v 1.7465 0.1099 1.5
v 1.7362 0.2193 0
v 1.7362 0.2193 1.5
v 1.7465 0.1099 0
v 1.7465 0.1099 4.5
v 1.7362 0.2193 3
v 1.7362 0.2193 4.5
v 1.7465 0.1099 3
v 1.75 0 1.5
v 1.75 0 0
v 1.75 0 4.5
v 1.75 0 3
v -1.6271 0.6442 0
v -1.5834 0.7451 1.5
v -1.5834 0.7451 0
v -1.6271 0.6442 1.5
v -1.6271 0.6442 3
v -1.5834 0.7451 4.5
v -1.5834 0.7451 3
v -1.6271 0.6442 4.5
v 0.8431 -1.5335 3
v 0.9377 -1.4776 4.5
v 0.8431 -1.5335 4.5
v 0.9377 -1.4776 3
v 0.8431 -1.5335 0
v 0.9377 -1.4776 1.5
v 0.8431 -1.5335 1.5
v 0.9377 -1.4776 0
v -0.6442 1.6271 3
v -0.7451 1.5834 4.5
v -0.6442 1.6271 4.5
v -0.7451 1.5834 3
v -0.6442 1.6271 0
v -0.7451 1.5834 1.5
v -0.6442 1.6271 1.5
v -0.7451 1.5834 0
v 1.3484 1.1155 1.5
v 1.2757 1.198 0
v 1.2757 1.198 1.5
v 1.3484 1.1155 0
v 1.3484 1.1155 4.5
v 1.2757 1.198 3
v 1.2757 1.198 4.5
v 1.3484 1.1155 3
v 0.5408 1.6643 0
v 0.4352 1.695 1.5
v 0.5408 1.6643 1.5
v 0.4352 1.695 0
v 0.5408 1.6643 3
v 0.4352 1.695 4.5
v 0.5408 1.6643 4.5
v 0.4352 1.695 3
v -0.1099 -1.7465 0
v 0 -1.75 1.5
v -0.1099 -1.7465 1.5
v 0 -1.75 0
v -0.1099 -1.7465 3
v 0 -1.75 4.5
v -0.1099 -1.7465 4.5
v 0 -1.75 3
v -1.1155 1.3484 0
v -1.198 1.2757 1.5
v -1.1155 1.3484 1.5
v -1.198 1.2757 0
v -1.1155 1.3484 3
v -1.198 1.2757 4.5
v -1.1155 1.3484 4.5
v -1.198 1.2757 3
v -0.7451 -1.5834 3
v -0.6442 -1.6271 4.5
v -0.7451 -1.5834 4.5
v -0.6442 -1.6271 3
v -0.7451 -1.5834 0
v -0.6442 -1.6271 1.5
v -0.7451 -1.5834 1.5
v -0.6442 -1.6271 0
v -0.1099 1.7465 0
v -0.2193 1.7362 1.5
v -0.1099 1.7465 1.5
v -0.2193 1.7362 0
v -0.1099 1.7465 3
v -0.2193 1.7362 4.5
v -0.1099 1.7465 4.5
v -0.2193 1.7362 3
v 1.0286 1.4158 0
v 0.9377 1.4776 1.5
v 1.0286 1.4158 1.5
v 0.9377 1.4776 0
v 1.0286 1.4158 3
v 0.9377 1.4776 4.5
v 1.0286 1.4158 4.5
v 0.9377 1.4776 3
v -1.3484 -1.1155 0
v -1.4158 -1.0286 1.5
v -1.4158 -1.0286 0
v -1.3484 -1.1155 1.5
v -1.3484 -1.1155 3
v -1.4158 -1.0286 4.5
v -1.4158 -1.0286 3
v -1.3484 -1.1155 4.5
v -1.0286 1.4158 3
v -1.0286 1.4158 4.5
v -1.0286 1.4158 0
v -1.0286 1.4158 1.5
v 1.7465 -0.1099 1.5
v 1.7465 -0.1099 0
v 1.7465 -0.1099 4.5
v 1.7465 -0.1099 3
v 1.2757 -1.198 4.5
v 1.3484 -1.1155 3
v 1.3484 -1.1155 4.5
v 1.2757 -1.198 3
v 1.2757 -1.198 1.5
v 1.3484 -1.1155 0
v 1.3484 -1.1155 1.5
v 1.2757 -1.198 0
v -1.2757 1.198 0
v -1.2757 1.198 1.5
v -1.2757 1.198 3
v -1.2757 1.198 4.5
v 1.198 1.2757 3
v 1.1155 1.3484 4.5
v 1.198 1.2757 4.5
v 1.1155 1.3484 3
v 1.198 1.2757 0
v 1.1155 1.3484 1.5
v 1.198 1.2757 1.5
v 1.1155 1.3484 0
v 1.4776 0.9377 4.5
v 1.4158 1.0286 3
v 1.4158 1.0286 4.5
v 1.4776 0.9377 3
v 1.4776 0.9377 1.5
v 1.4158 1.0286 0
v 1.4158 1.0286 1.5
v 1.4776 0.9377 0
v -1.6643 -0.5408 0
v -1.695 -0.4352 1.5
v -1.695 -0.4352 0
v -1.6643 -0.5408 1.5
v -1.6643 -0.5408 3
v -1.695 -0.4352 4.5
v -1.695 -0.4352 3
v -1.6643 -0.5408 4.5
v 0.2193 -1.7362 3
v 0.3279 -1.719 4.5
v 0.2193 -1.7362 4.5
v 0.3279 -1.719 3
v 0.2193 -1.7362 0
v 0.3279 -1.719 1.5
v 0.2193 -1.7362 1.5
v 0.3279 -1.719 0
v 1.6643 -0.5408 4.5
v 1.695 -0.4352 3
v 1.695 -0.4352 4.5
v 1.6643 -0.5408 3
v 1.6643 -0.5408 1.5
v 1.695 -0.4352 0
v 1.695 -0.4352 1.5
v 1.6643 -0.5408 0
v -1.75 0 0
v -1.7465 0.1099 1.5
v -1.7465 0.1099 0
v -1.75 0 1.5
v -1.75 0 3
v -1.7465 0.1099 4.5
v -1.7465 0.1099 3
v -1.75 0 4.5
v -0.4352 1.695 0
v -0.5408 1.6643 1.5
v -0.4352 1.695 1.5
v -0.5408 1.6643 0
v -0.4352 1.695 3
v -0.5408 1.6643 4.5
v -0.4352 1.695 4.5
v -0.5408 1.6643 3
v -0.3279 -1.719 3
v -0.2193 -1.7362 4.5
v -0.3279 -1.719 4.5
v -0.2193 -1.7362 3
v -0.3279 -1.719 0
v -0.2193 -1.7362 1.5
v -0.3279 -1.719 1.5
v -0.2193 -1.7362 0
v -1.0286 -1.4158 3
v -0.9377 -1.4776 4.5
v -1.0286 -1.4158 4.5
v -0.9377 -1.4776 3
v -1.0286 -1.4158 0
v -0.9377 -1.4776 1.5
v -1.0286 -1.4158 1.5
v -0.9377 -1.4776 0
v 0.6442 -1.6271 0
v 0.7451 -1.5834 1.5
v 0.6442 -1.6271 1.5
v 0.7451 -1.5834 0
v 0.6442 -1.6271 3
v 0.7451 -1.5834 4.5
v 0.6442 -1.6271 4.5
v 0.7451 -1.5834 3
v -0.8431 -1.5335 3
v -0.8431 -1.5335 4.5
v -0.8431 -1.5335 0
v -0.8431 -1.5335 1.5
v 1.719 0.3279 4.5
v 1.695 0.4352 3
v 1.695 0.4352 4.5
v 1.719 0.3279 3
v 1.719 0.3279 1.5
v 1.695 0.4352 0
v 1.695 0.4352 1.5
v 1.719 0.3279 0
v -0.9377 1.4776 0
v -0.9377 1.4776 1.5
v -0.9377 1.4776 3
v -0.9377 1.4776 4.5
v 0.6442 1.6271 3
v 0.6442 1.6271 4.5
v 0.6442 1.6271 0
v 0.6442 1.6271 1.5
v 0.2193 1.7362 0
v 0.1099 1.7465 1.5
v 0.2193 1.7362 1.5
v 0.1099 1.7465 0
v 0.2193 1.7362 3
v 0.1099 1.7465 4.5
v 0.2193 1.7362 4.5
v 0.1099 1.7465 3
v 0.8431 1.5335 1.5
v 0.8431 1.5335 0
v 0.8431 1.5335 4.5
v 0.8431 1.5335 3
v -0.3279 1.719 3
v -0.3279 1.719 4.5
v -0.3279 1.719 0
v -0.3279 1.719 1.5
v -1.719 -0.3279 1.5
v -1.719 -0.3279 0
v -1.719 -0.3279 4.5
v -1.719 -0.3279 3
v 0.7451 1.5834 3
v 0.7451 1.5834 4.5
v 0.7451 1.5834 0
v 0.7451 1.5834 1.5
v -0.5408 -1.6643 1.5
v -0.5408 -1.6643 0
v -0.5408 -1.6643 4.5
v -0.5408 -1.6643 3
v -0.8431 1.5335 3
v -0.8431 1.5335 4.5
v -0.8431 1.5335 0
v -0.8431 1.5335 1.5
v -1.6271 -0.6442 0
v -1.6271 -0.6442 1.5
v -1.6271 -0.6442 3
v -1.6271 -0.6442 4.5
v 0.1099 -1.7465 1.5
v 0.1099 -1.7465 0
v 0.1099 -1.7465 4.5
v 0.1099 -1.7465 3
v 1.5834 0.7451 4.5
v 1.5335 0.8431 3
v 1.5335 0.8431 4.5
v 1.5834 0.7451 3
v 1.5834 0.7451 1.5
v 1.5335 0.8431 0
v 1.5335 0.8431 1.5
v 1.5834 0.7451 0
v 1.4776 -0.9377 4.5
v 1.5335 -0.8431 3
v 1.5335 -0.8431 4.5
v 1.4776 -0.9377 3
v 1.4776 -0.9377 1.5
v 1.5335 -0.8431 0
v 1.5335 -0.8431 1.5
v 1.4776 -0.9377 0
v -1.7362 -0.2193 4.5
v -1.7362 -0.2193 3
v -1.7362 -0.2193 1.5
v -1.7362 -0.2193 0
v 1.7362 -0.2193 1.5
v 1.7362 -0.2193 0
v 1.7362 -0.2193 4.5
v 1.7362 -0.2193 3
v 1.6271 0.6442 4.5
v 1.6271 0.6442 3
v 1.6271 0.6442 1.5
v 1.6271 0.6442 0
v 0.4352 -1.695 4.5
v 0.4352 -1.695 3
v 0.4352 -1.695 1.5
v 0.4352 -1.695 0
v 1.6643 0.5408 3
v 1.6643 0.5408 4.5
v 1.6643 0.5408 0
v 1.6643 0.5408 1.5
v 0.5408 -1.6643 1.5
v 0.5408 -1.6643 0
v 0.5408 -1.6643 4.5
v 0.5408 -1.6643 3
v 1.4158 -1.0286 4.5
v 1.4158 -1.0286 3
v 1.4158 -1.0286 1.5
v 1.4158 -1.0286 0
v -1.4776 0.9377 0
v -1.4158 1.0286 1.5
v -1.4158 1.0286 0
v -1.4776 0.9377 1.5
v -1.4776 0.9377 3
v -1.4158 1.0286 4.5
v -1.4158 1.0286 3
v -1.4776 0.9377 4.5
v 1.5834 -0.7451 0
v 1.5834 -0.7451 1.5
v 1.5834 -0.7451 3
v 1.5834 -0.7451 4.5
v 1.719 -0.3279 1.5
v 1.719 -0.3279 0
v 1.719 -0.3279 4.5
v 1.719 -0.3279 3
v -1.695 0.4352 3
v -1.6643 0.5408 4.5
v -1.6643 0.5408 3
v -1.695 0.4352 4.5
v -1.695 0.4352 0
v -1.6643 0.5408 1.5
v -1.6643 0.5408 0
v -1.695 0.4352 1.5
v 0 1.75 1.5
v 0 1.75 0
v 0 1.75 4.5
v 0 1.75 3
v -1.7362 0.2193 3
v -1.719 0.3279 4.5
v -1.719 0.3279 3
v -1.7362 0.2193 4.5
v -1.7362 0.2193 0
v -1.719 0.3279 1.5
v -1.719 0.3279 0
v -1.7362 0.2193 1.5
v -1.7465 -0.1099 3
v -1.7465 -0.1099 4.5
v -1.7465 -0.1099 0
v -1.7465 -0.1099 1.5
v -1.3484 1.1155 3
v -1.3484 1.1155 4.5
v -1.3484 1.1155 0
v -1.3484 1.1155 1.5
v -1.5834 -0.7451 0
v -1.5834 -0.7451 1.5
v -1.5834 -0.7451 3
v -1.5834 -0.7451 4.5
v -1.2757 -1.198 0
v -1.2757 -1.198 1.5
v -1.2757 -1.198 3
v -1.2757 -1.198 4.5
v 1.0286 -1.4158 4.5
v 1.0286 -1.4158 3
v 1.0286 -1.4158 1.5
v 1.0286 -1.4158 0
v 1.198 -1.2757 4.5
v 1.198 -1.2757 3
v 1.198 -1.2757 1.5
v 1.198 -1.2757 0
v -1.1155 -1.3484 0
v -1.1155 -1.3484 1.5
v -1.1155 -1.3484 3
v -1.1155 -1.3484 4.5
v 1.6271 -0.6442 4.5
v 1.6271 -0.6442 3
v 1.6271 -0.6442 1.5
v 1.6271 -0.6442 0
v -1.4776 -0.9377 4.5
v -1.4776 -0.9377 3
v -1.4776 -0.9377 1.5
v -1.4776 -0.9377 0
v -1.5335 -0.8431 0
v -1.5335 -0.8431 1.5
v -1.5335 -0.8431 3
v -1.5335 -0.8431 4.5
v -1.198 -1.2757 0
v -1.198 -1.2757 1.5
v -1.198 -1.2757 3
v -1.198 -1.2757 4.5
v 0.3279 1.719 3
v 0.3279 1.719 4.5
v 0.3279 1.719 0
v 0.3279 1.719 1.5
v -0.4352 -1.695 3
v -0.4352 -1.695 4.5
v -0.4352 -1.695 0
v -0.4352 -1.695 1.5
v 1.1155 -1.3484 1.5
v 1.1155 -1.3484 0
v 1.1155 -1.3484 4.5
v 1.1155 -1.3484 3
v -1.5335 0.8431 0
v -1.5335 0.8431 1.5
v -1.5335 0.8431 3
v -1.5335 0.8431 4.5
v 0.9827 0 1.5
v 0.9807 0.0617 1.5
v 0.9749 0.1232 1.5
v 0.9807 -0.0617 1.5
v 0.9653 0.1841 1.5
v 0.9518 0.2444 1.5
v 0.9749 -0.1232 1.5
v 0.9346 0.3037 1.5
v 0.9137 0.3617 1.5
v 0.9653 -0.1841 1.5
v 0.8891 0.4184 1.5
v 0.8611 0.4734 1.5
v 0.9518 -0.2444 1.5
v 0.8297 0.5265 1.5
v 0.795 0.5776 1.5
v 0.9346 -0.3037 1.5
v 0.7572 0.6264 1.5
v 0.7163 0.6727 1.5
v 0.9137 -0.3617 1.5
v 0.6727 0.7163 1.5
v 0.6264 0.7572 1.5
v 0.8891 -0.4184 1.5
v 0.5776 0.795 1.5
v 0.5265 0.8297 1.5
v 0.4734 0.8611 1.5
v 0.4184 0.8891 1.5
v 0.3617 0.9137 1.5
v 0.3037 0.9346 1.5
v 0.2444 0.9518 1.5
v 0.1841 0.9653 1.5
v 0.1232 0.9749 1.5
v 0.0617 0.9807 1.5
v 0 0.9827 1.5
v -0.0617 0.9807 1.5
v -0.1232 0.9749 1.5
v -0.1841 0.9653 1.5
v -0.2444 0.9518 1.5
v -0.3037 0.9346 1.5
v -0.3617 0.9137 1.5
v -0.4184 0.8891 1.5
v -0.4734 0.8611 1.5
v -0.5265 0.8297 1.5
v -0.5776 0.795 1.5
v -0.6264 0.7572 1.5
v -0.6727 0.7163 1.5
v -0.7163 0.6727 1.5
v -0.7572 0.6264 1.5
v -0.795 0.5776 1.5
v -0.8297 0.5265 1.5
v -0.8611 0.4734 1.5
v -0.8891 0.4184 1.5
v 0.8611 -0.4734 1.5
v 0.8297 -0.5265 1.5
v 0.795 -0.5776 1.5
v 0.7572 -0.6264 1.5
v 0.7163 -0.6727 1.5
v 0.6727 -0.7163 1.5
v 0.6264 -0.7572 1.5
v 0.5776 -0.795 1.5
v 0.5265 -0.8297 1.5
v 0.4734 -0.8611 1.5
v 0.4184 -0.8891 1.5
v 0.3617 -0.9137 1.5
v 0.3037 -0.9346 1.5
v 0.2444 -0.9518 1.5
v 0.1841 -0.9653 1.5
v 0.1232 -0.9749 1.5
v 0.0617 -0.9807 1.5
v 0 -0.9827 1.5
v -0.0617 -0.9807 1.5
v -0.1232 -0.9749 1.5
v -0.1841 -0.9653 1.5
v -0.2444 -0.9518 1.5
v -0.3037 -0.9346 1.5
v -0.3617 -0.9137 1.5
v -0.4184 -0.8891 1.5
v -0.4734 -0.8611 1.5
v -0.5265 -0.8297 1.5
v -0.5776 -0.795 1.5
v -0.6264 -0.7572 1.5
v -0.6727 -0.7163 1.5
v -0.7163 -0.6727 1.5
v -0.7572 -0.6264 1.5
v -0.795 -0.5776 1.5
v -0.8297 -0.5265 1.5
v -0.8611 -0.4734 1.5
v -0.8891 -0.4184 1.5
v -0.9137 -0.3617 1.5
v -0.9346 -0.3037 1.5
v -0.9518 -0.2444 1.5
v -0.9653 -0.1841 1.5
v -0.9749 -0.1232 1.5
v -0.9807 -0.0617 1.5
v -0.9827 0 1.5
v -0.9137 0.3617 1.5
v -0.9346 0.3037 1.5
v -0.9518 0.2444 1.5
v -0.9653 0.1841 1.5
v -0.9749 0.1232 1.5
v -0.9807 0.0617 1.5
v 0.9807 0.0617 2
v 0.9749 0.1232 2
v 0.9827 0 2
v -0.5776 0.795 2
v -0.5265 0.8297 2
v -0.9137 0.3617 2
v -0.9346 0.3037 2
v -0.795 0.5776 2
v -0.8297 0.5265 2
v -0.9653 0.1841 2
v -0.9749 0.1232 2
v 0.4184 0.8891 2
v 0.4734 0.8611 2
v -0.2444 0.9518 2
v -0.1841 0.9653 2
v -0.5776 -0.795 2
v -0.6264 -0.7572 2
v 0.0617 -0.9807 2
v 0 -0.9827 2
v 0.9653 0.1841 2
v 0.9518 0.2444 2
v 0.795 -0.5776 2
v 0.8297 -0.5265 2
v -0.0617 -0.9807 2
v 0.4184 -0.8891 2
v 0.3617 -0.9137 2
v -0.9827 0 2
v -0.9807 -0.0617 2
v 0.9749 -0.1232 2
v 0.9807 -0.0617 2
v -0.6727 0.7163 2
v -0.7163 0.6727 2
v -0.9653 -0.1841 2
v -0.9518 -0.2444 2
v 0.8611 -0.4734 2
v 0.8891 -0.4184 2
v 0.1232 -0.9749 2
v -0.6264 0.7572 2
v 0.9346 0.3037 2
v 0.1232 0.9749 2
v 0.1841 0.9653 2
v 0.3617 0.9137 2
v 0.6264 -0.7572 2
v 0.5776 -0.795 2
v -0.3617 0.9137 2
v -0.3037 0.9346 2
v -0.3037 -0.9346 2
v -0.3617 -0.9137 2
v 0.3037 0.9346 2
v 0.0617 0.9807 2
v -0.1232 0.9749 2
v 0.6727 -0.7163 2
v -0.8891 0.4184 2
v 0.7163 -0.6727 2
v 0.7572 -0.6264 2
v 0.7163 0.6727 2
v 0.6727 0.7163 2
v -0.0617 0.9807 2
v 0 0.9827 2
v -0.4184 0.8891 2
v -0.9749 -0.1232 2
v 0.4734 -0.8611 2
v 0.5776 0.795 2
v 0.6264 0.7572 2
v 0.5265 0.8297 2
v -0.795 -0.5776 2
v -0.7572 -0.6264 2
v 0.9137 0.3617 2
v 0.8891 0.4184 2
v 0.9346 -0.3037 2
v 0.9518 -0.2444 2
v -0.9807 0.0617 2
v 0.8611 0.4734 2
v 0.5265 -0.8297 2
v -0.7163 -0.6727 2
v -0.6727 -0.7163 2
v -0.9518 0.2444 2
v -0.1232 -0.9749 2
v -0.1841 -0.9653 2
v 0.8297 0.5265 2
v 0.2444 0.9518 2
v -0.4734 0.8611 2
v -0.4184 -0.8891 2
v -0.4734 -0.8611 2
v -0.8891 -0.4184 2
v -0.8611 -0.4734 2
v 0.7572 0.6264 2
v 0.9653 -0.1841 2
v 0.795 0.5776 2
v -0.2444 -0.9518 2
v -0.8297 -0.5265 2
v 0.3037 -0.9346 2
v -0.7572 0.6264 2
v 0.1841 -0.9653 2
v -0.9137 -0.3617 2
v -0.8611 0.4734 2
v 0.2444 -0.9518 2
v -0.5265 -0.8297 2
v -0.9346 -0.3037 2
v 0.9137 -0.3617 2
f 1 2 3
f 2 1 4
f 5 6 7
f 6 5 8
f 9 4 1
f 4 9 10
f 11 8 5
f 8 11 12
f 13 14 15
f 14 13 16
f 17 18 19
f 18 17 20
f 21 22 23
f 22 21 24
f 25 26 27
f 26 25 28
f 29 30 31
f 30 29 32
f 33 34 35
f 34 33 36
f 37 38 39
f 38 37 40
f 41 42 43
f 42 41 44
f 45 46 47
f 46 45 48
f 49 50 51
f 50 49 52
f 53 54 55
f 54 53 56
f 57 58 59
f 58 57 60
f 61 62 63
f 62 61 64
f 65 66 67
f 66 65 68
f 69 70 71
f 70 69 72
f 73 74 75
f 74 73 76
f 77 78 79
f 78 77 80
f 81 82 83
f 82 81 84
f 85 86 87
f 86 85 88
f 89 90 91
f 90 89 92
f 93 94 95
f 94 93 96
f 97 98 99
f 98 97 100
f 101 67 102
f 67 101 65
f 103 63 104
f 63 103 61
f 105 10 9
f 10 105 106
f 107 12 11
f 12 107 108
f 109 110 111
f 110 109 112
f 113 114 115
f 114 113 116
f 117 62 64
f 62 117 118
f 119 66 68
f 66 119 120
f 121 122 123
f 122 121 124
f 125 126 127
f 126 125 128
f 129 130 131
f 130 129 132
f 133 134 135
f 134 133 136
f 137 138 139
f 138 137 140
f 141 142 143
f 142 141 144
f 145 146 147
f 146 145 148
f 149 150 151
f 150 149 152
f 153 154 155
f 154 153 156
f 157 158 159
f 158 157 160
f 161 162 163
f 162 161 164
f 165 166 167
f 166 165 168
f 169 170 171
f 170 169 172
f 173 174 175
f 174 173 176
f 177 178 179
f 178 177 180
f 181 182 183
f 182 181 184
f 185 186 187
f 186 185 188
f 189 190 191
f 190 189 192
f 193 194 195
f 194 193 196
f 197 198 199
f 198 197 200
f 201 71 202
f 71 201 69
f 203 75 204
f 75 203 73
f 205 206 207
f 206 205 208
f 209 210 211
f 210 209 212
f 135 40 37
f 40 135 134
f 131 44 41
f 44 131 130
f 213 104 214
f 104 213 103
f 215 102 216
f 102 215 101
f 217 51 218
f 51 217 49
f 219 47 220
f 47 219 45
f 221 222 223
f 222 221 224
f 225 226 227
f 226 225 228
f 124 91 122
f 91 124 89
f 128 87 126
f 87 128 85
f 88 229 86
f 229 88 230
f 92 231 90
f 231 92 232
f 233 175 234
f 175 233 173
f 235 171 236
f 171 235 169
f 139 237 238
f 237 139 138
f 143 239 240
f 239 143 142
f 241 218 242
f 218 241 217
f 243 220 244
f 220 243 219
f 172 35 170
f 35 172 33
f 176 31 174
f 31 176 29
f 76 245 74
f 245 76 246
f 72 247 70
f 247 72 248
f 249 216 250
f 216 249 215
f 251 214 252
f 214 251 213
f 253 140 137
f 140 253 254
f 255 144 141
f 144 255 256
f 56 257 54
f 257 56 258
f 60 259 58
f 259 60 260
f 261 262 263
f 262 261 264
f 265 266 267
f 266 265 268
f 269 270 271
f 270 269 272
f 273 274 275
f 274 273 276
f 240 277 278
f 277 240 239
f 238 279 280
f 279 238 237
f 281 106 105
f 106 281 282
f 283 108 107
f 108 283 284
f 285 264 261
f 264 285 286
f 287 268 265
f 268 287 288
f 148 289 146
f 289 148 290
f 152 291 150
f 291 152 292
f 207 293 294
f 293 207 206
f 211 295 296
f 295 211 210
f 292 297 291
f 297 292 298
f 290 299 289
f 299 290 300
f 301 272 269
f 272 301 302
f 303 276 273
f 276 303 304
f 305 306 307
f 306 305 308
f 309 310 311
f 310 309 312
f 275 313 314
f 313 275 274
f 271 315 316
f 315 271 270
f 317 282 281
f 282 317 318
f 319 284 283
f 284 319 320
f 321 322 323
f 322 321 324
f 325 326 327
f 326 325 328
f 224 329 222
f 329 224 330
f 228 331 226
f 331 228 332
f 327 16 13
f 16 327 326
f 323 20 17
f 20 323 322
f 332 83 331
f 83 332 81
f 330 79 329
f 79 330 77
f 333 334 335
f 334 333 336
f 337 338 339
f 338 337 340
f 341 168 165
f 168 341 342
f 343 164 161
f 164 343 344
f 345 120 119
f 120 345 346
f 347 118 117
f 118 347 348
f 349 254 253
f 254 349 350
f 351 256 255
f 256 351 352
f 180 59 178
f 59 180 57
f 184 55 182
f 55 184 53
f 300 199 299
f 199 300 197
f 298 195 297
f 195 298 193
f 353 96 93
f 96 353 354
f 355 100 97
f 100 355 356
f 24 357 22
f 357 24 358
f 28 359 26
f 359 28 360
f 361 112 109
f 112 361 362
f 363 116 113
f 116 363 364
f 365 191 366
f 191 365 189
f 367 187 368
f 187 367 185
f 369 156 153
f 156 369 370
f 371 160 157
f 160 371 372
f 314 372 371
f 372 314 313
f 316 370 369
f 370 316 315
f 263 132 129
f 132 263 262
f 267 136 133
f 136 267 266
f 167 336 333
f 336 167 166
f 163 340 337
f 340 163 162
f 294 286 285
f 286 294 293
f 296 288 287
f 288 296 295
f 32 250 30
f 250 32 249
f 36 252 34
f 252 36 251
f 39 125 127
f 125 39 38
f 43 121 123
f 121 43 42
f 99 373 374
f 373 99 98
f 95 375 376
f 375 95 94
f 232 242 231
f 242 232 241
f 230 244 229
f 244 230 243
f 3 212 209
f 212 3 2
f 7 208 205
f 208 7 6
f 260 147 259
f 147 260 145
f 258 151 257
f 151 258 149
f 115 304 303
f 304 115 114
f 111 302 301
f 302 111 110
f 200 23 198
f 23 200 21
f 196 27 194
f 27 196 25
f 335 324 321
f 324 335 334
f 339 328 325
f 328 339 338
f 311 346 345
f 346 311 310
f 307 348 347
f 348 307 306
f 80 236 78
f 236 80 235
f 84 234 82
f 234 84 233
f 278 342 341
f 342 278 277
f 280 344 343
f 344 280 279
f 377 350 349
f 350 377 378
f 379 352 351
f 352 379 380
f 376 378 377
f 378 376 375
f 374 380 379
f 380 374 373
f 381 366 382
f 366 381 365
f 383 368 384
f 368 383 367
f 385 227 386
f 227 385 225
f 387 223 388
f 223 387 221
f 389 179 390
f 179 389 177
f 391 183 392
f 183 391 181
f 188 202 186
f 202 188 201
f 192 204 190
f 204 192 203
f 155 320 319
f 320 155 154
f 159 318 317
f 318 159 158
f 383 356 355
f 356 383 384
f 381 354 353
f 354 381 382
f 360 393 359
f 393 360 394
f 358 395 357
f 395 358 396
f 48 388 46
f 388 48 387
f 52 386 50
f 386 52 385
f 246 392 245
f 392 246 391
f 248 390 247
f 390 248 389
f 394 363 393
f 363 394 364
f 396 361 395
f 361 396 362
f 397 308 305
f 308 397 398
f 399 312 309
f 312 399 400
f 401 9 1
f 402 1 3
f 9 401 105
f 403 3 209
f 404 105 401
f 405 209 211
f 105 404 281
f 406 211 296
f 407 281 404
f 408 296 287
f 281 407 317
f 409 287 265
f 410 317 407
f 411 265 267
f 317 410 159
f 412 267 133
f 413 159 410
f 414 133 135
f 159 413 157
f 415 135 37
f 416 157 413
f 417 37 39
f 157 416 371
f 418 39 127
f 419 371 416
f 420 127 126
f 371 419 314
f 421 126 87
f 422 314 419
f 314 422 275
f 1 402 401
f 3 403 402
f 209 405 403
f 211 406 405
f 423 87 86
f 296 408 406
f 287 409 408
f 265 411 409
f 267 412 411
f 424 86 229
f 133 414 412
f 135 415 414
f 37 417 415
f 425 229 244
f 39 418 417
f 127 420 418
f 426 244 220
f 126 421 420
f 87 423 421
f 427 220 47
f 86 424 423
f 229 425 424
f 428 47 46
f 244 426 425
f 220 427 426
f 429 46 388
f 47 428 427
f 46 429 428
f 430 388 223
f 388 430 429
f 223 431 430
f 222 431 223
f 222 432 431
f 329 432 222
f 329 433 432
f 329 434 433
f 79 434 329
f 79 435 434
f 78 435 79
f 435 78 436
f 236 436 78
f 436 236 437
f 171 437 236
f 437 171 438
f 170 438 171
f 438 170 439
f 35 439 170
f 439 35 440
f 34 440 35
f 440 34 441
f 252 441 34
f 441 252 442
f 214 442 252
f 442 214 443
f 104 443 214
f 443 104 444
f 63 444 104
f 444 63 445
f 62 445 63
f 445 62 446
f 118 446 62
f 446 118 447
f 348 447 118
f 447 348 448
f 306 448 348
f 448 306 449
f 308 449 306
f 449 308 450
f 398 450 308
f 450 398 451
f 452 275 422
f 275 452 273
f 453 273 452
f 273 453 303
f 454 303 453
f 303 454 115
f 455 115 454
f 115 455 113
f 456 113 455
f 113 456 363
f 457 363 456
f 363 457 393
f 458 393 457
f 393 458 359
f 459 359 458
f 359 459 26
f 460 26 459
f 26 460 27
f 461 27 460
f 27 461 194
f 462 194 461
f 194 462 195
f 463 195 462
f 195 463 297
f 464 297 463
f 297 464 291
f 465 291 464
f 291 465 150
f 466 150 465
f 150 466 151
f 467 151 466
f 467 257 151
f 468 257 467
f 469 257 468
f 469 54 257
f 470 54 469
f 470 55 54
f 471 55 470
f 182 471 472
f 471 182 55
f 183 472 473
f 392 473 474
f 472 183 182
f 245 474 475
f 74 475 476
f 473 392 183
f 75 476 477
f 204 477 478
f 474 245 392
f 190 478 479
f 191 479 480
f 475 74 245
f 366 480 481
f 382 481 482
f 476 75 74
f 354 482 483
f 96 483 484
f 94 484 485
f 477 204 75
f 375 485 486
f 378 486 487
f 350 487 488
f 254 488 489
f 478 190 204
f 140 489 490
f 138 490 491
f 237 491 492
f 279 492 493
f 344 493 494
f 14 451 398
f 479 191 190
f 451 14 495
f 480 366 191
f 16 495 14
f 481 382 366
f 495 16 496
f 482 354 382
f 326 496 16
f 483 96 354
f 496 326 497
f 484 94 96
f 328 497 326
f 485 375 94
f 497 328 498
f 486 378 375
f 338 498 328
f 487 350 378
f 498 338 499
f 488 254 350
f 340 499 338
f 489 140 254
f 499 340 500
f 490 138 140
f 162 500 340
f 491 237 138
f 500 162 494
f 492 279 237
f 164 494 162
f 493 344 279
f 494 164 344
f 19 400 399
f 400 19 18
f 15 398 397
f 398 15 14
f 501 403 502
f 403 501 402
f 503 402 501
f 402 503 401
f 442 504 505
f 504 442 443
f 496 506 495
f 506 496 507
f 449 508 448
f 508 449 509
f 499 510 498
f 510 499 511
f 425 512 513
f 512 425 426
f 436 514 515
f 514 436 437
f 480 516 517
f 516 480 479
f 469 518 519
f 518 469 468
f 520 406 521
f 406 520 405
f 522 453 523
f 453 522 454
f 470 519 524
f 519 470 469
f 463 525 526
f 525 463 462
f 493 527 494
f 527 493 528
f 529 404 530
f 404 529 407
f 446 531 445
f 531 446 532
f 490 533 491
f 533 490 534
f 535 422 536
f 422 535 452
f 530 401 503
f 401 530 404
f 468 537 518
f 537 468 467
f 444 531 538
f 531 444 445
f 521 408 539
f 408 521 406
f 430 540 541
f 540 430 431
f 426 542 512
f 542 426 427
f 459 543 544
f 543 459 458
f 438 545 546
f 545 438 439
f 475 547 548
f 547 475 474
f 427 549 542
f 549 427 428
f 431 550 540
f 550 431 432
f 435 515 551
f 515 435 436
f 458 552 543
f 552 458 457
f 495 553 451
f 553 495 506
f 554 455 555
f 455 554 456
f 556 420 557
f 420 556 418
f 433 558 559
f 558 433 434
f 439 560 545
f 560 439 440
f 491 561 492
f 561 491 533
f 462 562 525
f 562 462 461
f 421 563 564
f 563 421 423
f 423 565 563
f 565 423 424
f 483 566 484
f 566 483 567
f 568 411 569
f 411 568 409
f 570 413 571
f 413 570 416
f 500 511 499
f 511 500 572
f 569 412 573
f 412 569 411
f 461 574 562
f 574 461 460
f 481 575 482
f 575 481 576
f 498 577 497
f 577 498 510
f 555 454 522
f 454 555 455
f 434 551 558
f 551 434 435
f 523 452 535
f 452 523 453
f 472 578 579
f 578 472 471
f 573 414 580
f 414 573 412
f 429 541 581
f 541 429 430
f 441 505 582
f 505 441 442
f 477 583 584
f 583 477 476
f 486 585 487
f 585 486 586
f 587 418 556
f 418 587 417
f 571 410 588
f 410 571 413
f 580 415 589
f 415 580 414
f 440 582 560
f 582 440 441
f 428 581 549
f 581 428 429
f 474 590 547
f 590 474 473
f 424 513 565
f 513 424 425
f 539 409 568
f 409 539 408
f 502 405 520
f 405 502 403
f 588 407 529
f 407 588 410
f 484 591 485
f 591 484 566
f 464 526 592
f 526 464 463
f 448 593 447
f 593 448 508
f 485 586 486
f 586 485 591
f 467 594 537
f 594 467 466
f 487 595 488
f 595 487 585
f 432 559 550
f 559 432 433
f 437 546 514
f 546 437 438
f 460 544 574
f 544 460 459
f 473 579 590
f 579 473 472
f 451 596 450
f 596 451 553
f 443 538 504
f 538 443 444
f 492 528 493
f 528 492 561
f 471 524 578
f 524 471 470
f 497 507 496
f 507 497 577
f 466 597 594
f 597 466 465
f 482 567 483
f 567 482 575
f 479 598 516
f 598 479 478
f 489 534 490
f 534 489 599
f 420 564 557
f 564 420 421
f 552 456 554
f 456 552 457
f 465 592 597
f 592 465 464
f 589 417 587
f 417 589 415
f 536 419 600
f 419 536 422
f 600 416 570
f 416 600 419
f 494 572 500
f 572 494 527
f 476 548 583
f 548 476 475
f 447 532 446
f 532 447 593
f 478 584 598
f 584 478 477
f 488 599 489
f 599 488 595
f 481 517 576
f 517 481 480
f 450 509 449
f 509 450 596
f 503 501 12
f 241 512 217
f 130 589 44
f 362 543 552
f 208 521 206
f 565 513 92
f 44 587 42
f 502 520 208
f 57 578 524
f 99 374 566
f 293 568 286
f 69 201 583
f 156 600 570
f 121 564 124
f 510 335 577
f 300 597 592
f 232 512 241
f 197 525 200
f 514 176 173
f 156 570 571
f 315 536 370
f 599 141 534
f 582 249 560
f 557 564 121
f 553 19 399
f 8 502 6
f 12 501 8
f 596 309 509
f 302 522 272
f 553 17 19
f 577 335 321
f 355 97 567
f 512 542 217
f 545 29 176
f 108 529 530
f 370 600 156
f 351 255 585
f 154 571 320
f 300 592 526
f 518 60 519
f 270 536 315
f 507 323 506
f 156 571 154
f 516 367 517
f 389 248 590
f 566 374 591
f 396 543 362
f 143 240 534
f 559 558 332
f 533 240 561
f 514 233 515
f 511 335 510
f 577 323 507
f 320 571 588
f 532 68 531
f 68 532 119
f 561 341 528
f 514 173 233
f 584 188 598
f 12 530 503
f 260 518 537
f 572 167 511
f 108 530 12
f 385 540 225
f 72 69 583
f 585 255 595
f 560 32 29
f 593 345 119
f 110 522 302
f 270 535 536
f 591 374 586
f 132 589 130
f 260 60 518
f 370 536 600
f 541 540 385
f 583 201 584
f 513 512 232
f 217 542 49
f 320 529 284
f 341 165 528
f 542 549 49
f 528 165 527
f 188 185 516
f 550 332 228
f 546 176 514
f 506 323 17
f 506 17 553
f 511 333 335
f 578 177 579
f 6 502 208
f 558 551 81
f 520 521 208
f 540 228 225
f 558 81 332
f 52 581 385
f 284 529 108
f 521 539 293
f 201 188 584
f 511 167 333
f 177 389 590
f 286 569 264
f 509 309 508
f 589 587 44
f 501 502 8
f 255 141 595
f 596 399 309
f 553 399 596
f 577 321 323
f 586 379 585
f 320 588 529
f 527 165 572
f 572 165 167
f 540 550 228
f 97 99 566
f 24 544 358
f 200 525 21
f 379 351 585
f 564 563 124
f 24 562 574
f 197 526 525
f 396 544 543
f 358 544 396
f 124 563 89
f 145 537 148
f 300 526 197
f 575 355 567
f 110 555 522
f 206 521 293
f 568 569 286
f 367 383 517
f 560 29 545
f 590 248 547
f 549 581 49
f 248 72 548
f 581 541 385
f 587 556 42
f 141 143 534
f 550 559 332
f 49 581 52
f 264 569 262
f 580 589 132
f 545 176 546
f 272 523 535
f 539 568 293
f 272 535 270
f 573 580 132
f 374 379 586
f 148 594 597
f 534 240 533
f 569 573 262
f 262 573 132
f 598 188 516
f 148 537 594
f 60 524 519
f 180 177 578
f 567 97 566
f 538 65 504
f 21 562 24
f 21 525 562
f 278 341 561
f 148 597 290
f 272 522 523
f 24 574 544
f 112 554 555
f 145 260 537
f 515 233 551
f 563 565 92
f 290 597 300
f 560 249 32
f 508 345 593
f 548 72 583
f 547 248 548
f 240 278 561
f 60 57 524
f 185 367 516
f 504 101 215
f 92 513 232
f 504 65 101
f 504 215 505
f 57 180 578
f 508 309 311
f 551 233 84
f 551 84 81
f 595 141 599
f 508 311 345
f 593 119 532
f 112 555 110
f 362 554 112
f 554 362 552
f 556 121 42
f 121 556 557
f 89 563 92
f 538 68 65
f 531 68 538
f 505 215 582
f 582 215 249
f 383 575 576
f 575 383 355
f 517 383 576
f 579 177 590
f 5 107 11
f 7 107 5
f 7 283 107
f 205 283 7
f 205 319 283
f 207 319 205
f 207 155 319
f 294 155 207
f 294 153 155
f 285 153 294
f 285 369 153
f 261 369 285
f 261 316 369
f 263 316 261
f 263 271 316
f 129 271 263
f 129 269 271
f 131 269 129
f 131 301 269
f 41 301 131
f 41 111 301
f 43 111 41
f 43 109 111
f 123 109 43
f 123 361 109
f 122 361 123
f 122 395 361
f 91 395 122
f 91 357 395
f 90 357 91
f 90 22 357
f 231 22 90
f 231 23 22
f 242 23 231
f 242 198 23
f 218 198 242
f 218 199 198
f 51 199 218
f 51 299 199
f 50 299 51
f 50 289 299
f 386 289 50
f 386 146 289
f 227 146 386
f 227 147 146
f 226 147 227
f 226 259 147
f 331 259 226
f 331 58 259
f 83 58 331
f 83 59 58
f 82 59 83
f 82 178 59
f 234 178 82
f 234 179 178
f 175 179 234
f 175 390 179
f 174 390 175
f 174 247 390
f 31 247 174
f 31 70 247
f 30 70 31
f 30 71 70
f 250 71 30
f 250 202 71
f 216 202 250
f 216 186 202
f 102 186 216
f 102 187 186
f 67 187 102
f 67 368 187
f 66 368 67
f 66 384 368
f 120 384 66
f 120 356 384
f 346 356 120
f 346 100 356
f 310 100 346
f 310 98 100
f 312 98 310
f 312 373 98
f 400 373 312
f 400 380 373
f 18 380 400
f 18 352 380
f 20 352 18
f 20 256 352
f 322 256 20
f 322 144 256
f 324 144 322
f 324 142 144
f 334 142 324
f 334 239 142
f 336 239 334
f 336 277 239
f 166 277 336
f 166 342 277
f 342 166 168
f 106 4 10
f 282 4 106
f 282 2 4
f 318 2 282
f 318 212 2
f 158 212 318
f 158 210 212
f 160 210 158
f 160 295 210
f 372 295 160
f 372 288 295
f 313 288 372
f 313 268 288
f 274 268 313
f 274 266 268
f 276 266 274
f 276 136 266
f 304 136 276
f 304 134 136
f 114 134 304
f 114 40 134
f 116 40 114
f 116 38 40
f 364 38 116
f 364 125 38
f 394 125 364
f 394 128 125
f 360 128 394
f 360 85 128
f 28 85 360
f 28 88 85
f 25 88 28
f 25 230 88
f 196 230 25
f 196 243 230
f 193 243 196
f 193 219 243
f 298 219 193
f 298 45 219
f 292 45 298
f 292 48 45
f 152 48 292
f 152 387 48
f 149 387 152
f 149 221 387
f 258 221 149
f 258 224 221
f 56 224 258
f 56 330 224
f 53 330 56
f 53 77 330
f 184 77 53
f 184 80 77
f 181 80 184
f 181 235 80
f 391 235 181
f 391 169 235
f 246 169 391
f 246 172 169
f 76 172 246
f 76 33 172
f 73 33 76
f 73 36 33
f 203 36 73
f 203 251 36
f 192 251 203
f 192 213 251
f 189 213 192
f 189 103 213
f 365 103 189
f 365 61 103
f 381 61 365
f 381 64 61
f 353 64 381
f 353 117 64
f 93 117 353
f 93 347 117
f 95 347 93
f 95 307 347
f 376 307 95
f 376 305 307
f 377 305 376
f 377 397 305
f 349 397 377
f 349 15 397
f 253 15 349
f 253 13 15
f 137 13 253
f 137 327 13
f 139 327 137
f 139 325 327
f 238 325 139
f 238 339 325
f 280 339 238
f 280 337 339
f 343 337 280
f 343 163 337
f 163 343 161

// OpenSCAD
//Outer radius of the peg the clip will attach to
pegRadius = 1.75;
//Thickness of the clip.
clipThickness = 1.5;
//Bevel angle from vertical of the clip and peg notch.  The steeper the angle, the more holding power and thinner notch in your peg, but the harder it is to print the peg without support.  Supports are bad.
bevelAngle = 37.5;
//Thickness of the clip before it starts beveling.  This can be 0 for a sharp-edged clip, or greater than the thickness for a clip with no bevel at all.
bevelStart = .5;

offset = ((clipThickness-bevelStart) / tan((90-bevelAngle)));

//1.56321 - .1;


//Number of sides to make it "round".  I like very round, so I use 100, but less round renders faster.
$fn=100;

//jump = 10*ceil(outerRadius * 3 / 10);

difference() {
	cylinder(
		h=clipThickness*3,
		r=pegRadius
	);
	translate([0, 0, clipThickness]) {
		difference() {
			cylinder(
				h=clipThickness,
				r=pegRadius
			);
			cylinder(
				h=bevelStart,
				r=pegRadius-offset
			);
			translate([0, 0, bevelStart]) {
				cylinder(
					h=clipThickness - bevelStart,
					r1=pegRadius - offset,
					r2=pegRadius
				);
			}
		}
	}
}
